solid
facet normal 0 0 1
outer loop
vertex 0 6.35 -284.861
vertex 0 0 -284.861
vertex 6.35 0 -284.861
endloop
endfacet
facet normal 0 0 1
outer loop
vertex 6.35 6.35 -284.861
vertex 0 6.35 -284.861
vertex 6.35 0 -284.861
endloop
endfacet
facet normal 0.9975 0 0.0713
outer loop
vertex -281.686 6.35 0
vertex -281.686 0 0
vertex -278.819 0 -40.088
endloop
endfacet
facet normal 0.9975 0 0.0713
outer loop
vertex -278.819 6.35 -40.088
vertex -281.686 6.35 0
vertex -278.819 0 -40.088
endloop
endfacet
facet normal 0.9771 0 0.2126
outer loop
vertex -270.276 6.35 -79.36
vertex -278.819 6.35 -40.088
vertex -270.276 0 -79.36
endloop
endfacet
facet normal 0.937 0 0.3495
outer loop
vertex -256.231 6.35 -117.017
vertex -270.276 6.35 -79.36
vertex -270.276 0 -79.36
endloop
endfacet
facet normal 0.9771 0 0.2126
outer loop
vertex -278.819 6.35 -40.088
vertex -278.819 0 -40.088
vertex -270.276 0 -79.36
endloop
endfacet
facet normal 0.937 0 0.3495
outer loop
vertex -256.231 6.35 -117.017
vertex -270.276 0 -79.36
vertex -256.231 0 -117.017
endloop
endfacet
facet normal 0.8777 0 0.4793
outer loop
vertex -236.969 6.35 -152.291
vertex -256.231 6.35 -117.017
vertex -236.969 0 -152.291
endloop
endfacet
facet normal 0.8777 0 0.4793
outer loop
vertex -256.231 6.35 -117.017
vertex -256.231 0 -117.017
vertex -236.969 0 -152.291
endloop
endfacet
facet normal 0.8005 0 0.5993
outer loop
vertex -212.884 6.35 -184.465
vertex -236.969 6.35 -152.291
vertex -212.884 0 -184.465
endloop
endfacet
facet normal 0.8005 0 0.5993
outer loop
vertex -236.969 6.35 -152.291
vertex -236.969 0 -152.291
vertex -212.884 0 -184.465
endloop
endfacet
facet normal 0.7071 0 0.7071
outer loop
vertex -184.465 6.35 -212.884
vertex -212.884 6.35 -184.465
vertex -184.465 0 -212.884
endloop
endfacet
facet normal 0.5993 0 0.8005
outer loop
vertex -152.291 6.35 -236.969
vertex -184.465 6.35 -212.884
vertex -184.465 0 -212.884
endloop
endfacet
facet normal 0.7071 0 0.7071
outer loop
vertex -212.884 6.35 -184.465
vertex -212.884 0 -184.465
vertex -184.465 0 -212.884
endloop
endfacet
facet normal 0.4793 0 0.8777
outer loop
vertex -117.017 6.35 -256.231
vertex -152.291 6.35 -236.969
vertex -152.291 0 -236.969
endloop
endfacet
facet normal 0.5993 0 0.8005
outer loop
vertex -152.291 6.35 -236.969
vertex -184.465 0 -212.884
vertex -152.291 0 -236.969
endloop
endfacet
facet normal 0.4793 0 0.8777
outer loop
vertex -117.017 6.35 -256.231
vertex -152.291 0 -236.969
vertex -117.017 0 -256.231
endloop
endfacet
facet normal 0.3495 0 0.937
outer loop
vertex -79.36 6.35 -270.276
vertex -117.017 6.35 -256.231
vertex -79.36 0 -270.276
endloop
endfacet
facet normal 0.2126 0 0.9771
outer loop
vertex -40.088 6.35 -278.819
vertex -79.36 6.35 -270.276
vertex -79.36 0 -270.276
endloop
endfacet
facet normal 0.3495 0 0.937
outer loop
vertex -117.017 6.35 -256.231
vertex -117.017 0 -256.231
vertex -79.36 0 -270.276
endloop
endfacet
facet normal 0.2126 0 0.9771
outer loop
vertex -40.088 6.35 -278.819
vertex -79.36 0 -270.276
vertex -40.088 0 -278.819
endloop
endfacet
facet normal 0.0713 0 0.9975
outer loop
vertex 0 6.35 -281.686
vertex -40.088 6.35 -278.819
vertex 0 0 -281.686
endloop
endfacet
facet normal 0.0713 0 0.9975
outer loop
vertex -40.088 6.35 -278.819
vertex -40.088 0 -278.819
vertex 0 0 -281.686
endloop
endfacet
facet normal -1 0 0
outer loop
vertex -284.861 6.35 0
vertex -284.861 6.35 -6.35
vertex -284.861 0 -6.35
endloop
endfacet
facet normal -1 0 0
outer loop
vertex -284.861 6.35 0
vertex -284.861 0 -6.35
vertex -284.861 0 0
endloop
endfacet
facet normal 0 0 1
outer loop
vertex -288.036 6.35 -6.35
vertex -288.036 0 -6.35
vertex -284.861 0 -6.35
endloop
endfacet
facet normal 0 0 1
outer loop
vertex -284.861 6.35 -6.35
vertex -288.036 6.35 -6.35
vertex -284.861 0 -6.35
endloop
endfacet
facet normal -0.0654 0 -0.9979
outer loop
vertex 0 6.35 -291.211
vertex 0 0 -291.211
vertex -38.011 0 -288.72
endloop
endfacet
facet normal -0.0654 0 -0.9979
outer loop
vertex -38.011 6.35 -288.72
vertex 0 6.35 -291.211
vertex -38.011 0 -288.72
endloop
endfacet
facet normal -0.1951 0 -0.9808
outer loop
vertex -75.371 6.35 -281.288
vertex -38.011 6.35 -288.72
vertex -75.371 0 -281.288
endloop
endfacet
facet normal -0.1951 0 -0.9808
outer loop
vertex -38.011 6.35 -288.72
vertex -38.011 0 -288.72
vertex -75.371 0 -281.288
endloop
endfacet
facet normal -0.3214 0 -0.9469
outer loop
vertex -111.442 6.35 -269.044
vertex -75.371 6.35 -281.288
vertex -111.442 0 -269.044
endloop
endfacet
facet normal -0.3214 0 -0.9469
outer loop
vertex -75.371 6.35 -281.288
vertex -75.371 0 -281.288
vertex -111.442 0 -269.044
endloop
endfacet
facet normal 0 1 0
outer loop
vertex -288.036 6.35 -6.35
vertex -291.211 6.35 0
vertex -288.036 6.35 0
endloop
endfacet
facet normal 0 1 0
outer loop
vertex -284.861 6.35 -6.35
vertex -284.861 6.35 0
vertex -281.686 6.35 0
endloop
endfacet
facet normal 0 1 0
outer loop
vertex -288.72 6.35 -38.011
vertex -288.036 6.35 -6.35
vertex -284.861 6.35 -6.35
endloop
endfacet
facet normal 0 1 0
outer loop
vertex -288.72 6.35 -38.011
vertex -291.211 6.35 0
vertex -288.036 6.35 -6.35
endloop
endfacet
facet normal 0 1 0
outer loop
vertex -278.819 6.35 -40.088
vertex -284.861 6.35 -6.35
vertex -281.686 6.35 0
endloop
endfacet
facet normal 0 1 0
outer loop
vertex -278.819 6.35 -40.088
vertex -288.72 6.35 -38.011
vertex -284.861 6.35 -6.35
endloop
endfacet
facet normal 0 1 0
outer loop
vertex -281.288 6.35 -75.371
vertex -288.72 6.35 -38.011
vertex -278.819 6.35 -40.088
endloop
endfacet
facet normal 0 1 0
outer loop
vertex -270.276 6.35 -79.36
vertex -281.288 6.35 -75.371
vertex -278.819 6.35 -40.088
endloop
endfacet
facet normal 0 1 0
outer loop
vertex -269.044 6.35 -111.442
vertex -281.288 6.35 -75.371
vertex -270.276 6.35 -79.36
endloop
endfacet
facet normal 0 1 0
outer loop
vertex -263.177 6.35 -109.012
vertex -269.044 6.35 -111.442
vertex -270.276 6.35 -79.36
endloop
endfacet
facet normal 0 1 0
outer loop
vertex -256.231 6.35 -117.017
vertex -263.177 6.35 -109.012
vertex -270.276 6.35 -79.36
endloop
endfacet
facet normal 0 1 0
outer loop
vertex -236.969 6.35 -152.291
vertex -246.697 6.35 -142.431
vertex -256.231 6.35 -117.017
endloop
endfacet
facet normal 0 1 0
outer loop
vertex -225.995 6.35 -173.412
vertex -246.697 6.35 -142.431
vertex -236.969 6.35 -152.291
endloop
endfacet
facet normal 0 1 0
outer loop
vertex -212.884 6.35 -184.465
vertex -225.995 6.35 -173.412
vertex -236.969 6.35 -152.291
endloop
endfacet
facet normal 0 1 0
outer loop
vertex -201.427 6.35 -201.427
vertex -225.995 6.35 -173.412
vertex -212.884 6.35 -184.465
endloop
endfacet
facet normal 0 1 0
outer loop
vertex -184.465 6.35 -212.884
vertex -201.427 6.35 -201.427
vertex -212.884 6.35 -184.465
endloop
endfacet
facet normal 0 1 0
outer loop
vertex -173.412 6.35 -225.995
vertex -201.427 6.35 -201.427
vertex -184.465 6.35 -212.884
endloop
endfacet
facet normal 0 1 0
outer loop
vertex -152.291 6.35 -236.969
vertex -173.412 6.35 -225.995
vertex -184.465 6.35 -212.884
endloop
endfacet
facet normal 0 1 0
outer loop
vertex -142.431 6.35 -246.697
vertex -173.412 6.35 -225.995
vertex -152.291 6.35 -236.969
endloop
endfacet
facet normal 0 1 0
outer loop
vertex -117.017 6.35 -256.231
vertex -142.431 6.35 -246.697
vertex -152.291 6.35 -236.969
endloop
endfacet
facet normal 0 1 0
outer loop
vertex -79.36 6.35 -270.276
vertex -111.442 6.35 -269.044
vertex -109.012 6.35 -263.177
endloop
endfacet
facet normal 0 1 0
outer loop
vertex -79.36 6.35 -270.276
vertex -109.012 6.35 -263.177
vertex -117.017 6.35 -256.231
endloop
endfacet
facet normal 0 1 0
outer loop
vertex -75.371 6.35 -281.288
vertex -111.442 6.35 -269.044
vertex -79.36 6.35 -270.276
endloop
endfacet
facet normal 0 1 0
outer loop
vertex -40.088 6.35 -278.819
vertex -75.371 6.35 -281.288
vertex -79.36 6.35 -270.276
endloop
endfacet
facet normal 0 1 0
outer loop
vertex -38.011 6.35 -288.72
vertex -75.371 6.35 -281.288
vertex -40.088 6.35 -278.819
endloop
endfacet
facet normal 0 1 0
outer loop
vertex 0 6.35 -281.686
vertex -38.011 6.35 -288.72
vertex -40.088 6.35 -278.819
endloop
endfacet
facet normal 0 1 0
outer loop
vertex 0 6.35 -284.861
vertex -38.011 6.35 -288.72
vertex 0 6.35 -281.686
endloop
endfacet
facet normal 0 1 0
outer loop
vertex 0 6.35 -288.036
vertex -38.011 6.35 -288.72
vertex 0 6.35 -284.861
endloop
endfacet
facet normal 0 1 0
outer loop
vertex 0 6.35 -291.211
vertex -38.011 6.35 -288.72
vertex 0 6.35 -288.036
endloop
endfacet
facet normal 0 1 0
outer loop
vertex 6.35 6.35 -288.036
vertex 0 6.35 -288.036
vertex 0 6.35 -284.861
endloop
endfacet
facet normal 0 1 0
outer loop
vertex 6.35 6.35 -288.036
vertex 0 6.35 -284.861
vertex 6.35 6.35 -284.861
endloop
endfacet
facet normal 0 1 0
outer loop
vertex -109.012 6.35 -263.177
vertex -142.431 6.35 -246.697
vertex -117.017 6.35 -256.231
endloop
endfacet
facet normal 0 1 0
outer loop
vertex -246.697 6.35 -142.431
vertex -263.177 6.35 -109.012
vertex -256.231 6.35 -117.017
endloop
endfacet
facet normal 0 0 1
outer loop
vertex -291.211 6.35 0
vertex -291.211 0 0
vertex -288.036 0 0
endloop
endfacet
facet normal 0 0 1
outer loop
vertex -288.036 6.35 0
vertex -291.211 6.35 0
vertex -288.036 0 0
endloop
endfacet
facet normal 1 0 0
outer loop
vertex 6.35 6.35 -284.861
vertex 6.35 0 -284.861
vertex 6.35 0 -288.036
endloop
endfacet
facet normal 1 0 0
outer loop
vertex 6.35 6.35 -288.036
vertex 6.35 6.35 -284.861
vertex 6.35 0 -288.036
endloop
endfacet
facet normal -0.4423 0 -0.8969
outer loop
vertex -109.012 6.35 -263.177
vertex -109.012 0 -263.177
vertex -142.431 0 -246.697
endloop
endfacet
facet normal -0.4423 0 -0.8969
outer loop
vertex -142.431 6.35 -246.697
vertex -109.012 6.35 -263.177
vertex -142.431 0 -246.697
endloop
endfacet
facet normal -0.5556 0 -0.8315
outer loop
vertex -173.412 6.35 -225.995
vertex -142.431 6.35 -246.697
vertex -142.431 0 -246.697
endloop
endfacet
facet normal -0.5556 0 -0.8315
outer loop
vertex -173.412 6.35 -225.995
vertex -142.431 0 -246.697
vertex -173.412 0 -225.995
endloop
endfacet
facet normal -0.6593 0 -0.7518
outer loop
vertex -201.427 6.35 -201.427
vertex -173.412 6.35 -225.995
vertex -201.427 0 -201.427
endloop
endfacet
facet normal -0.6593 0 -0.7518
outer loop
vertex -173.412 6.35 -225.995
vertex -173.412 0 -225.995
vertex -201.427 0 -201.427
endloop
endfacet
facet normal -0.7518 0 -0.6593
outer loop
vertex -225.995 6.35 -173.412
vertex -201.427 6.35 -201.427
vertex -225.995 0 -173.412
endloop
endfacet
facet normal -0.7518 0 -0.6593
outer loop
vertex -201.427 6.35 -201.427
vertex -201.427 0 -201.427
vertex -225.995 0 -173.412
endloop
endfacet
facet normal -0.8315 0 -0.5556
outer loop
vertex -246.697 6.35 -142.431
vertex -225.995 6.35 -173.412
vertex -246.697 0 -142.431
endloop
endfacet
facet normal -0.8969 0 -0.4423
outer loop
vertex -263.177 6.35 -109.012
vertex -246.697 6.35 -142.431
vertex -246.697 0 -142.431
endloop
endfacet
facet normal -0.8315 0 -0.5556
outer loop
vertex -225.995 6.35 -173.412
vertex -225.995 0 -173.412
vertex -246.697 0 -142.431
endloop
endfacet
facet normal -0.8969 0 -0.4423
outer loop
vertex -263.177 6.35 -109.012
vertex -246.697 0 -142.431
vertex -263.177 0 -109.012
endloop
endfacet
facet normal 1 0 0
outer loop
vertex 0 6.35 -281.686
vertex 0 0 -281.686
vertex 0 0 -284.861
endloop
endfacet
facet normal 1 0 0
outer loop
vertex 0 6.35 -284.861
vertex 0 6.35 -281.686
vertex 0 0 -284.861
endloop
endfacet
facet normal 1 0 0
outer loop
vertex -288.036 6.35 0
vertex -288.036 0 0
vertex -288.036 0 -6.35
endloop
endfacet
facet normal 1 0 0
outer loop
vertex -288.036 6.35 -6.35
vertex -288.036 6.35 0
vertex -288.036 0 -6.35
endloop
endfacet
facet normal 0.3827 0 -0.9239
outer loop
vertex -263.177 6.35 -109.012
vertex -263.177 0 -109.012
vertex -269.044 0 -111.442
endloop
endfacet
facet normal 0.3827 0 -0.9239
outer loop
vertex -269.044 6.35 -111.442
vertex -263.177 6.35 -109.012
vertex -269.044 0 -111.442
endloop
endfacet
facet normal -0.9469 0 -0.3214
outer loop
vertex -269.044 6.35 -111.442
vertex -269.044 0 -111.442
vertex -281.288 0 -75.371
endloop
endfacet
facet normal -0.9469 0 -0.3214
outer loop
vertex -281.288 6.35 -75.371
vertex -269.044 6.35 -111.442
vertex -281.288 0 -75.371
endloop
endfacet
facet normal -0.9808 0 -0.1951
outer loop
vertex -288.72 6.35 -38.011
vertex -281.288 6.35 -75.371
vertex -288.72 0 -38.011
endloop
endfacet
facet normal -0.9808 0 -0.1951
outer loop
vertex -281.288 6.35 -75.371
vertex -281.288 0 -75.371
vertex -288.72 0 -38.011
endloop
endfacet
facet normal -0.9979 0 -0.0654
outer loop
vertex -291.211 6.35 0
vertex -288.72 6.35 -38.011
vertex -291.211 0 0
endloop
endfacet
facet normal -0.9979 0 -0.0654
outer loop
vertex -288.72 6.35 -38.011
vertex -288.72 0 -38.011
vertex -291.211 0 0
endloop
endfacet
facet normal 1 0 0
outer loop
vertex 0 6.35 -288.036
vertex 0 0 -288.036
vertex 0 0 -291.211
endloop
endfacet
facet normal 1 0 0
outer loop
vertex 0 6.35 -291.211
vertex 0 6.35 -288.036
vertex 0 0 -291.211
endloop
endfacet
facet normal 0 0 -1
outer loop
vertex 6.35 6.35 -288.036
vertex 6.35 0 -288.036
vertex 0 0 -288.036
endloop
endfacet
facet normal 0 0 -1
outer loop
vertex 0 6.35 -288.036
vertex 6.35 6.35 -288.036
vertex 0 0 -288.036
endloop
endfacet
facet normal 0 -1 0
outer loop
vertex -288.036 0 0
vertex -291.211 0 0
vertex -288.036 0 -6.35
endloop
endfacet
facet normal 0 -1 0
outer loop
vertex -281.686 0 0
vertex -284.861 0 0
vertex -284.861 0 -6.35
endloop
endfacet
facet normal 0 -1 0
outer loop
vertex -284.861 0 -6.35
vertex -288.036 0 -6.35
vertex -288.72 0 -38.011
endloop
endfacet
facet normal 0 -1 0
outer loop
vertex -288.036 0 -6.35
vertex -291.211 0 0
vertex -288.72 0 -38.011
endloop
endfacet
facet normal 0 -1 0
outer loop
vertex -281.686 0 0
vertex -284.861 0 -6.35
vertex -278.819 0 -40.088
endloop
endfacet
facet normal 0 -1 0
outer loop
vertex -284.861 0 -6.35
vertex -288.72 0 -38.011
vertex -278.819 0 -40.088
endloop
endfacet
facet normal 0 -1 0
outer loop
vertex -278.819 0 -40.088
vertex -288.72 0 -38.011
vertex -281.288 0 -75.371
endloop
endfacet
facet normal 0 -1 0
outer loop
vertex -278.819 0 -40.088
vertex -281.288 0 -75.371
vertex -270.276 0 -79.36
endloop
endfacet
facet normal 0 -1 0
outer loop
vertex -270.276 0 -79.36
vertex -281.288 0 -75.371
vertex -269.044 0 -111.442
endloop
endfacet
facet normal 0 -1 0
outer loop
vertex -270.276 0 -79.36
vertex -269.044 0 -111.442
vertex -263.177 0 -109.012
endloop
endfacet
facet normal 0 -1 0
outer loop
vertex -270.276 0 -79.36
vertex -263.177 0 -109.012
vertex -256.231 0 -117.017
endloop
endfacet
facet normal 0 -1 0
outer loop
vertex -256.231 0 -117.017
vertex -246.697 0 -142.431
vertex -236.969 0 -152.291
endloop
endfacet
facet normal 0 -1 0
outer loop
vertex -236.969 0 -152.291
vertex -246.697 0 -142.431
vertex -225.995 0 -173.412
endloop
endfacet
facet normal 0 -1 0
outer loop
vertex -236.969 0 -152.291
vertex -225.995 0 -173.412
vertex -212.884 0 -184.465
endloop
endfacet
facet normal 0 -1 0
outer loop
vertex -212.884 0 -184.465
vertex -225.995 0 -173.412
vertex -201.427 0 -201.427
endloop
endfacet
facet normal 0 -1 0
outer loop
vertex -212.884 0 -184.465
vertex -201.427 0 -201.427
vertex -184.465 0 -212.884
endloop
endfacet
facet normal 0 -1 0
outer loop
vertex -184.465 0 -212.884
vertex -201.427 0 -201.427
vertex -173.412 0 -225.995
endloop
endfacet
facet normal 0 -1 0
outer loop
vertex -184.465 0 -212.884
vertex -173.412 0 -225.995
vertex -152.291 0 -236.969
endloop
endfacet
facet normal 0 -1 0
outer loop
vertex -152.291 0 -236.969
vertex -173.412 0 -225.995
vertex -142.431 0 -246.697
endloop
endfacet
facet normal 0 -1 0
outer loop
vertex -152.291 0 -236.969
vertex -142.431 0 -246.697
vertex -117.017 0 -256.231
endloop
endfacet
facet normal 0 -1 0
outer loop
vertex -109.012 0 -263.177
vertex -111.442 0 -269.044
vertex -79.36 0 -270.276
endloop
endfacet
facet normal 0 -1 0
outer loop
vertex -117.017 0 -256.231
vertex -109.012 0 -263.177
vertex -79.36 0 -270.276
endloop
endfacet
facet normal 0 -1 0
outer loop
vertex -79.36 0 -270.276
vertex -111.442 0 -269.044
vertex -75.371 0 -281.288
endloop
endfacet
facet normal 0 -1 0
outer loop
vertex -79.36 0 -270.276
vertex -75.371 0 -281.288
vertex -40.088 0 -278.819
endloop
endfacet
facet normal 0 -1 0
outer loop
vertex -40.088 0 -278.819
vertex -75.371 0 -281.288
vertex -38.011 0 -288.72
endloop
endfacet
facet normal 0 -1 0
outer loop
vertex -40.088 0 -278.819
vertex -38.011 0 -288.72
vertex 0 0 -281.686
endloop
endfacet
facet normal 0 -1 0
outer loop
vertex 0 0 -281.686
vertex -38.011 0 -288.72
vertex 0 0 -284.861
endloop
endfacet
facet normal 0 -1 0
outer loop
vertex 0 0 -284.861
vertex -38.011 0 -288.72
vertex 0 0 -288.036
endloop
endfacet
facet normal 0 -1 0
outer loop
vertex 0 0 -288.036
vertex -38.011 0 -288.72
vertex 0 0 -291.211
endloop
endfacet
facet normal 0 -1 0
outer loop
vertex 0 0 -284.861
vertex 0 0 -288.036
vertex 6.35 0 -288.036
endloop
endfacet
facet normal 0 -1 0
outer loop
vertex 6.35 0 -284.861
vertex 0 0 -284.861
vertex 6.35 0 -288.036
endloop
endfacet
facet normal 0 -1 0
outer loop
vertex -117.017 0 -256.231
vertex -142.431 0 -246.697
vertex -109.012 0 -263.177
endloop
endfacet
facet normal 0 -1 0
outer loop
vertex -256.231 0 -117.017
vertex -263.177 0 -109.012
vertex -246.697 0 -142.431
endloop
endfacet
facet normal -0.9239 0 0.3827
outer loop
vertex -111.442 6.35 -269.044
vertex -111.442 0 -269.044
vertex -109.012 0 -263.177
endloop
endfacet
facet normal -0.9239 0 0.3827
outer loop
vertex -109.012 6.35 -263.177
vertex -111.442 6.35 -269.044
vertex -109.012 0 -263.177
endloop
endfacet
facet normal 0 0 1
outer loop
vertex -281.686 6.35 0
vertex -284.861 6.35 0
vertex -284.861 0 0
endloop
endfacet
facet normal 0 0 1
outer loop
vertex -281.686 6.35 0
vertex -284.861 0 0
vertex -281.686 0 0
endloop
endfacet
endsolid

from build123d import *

# Parameters (mm, degrees)
BOSS_EXTRUDE2_DEPTH = 6.35


with BuildPart() as part:
    # Sketch1 → Boss-Extrude2 (new body)
    with BuildSketch(Plane(origin=(0, 0, 0), x_dir=(1, 0, 0), z_dir=(0, 1, 0))):
        with BuildLine():
            Line((0, 288.036), (0, 291.211))
            ThreePointArc((0, 291.211), (-56.812447765, 285.615462292), (-111.441625022, 269.043882542))
            Line((-111.441625022, 269.043882542), (-109.011585227, 263.177247511))
            ThreePointArc((-109.011585227, 263.177247511), (-55.57362422, 279.387475761), (0, 284.861))
            Line((0, 284.861), (6.35, 284.861))
            Line((6.35, 284.861), (6.35, 288.036))
            Line((6.35, 288.036), (0, 288.036))
        make_face()
        with BuildLine():
            ThreePointArc((0, 284.861), (-55.57362422, 279.387475761), (-109.011585227, 263.177247511))
            ThreePointArc((-109.011585227, 263.177247511), (-201.427144796, 201.427144796), (-263.177247511, 109.011585227))
            ThreePointArc((-263.177247511, 109.011585227), (-279.387475761, 55.57362422), (-284.861, 0))
            Line((-284.861, 0), (-281.686, 0))
            ThreePointArc((-281.686, 0), (-199.182080765, 199.182080765), (0, 281.686))
            Line((0, 281.686), (0, 284.861))
        make_face()
        with BuildLine():
            Line((-263.177247511, 109.011585227), (-269.043882542, 111.441625022))
            ThreePointArc((-269.043882542, 111.441625022), (-285.615462292, 56.812447765), (-291.211, 0))
            Line((-291.211, 0), (-288.036, 0))
            Line((-288.036, 0), (-288.036, 6.35))
            Line((-288.036, 6.35), (-284.861, 6.35))
            Line((-284.861, 6.35), (-284.861, 0))
            ThreePointArc((-284.861, 0), (-279.387475761, 55.57362422), (-263.177247511, 109.011585227))
        make_face()
    extrude(amount=BOSS_EXTRUDE2_DEPTH)


solid = part.part
